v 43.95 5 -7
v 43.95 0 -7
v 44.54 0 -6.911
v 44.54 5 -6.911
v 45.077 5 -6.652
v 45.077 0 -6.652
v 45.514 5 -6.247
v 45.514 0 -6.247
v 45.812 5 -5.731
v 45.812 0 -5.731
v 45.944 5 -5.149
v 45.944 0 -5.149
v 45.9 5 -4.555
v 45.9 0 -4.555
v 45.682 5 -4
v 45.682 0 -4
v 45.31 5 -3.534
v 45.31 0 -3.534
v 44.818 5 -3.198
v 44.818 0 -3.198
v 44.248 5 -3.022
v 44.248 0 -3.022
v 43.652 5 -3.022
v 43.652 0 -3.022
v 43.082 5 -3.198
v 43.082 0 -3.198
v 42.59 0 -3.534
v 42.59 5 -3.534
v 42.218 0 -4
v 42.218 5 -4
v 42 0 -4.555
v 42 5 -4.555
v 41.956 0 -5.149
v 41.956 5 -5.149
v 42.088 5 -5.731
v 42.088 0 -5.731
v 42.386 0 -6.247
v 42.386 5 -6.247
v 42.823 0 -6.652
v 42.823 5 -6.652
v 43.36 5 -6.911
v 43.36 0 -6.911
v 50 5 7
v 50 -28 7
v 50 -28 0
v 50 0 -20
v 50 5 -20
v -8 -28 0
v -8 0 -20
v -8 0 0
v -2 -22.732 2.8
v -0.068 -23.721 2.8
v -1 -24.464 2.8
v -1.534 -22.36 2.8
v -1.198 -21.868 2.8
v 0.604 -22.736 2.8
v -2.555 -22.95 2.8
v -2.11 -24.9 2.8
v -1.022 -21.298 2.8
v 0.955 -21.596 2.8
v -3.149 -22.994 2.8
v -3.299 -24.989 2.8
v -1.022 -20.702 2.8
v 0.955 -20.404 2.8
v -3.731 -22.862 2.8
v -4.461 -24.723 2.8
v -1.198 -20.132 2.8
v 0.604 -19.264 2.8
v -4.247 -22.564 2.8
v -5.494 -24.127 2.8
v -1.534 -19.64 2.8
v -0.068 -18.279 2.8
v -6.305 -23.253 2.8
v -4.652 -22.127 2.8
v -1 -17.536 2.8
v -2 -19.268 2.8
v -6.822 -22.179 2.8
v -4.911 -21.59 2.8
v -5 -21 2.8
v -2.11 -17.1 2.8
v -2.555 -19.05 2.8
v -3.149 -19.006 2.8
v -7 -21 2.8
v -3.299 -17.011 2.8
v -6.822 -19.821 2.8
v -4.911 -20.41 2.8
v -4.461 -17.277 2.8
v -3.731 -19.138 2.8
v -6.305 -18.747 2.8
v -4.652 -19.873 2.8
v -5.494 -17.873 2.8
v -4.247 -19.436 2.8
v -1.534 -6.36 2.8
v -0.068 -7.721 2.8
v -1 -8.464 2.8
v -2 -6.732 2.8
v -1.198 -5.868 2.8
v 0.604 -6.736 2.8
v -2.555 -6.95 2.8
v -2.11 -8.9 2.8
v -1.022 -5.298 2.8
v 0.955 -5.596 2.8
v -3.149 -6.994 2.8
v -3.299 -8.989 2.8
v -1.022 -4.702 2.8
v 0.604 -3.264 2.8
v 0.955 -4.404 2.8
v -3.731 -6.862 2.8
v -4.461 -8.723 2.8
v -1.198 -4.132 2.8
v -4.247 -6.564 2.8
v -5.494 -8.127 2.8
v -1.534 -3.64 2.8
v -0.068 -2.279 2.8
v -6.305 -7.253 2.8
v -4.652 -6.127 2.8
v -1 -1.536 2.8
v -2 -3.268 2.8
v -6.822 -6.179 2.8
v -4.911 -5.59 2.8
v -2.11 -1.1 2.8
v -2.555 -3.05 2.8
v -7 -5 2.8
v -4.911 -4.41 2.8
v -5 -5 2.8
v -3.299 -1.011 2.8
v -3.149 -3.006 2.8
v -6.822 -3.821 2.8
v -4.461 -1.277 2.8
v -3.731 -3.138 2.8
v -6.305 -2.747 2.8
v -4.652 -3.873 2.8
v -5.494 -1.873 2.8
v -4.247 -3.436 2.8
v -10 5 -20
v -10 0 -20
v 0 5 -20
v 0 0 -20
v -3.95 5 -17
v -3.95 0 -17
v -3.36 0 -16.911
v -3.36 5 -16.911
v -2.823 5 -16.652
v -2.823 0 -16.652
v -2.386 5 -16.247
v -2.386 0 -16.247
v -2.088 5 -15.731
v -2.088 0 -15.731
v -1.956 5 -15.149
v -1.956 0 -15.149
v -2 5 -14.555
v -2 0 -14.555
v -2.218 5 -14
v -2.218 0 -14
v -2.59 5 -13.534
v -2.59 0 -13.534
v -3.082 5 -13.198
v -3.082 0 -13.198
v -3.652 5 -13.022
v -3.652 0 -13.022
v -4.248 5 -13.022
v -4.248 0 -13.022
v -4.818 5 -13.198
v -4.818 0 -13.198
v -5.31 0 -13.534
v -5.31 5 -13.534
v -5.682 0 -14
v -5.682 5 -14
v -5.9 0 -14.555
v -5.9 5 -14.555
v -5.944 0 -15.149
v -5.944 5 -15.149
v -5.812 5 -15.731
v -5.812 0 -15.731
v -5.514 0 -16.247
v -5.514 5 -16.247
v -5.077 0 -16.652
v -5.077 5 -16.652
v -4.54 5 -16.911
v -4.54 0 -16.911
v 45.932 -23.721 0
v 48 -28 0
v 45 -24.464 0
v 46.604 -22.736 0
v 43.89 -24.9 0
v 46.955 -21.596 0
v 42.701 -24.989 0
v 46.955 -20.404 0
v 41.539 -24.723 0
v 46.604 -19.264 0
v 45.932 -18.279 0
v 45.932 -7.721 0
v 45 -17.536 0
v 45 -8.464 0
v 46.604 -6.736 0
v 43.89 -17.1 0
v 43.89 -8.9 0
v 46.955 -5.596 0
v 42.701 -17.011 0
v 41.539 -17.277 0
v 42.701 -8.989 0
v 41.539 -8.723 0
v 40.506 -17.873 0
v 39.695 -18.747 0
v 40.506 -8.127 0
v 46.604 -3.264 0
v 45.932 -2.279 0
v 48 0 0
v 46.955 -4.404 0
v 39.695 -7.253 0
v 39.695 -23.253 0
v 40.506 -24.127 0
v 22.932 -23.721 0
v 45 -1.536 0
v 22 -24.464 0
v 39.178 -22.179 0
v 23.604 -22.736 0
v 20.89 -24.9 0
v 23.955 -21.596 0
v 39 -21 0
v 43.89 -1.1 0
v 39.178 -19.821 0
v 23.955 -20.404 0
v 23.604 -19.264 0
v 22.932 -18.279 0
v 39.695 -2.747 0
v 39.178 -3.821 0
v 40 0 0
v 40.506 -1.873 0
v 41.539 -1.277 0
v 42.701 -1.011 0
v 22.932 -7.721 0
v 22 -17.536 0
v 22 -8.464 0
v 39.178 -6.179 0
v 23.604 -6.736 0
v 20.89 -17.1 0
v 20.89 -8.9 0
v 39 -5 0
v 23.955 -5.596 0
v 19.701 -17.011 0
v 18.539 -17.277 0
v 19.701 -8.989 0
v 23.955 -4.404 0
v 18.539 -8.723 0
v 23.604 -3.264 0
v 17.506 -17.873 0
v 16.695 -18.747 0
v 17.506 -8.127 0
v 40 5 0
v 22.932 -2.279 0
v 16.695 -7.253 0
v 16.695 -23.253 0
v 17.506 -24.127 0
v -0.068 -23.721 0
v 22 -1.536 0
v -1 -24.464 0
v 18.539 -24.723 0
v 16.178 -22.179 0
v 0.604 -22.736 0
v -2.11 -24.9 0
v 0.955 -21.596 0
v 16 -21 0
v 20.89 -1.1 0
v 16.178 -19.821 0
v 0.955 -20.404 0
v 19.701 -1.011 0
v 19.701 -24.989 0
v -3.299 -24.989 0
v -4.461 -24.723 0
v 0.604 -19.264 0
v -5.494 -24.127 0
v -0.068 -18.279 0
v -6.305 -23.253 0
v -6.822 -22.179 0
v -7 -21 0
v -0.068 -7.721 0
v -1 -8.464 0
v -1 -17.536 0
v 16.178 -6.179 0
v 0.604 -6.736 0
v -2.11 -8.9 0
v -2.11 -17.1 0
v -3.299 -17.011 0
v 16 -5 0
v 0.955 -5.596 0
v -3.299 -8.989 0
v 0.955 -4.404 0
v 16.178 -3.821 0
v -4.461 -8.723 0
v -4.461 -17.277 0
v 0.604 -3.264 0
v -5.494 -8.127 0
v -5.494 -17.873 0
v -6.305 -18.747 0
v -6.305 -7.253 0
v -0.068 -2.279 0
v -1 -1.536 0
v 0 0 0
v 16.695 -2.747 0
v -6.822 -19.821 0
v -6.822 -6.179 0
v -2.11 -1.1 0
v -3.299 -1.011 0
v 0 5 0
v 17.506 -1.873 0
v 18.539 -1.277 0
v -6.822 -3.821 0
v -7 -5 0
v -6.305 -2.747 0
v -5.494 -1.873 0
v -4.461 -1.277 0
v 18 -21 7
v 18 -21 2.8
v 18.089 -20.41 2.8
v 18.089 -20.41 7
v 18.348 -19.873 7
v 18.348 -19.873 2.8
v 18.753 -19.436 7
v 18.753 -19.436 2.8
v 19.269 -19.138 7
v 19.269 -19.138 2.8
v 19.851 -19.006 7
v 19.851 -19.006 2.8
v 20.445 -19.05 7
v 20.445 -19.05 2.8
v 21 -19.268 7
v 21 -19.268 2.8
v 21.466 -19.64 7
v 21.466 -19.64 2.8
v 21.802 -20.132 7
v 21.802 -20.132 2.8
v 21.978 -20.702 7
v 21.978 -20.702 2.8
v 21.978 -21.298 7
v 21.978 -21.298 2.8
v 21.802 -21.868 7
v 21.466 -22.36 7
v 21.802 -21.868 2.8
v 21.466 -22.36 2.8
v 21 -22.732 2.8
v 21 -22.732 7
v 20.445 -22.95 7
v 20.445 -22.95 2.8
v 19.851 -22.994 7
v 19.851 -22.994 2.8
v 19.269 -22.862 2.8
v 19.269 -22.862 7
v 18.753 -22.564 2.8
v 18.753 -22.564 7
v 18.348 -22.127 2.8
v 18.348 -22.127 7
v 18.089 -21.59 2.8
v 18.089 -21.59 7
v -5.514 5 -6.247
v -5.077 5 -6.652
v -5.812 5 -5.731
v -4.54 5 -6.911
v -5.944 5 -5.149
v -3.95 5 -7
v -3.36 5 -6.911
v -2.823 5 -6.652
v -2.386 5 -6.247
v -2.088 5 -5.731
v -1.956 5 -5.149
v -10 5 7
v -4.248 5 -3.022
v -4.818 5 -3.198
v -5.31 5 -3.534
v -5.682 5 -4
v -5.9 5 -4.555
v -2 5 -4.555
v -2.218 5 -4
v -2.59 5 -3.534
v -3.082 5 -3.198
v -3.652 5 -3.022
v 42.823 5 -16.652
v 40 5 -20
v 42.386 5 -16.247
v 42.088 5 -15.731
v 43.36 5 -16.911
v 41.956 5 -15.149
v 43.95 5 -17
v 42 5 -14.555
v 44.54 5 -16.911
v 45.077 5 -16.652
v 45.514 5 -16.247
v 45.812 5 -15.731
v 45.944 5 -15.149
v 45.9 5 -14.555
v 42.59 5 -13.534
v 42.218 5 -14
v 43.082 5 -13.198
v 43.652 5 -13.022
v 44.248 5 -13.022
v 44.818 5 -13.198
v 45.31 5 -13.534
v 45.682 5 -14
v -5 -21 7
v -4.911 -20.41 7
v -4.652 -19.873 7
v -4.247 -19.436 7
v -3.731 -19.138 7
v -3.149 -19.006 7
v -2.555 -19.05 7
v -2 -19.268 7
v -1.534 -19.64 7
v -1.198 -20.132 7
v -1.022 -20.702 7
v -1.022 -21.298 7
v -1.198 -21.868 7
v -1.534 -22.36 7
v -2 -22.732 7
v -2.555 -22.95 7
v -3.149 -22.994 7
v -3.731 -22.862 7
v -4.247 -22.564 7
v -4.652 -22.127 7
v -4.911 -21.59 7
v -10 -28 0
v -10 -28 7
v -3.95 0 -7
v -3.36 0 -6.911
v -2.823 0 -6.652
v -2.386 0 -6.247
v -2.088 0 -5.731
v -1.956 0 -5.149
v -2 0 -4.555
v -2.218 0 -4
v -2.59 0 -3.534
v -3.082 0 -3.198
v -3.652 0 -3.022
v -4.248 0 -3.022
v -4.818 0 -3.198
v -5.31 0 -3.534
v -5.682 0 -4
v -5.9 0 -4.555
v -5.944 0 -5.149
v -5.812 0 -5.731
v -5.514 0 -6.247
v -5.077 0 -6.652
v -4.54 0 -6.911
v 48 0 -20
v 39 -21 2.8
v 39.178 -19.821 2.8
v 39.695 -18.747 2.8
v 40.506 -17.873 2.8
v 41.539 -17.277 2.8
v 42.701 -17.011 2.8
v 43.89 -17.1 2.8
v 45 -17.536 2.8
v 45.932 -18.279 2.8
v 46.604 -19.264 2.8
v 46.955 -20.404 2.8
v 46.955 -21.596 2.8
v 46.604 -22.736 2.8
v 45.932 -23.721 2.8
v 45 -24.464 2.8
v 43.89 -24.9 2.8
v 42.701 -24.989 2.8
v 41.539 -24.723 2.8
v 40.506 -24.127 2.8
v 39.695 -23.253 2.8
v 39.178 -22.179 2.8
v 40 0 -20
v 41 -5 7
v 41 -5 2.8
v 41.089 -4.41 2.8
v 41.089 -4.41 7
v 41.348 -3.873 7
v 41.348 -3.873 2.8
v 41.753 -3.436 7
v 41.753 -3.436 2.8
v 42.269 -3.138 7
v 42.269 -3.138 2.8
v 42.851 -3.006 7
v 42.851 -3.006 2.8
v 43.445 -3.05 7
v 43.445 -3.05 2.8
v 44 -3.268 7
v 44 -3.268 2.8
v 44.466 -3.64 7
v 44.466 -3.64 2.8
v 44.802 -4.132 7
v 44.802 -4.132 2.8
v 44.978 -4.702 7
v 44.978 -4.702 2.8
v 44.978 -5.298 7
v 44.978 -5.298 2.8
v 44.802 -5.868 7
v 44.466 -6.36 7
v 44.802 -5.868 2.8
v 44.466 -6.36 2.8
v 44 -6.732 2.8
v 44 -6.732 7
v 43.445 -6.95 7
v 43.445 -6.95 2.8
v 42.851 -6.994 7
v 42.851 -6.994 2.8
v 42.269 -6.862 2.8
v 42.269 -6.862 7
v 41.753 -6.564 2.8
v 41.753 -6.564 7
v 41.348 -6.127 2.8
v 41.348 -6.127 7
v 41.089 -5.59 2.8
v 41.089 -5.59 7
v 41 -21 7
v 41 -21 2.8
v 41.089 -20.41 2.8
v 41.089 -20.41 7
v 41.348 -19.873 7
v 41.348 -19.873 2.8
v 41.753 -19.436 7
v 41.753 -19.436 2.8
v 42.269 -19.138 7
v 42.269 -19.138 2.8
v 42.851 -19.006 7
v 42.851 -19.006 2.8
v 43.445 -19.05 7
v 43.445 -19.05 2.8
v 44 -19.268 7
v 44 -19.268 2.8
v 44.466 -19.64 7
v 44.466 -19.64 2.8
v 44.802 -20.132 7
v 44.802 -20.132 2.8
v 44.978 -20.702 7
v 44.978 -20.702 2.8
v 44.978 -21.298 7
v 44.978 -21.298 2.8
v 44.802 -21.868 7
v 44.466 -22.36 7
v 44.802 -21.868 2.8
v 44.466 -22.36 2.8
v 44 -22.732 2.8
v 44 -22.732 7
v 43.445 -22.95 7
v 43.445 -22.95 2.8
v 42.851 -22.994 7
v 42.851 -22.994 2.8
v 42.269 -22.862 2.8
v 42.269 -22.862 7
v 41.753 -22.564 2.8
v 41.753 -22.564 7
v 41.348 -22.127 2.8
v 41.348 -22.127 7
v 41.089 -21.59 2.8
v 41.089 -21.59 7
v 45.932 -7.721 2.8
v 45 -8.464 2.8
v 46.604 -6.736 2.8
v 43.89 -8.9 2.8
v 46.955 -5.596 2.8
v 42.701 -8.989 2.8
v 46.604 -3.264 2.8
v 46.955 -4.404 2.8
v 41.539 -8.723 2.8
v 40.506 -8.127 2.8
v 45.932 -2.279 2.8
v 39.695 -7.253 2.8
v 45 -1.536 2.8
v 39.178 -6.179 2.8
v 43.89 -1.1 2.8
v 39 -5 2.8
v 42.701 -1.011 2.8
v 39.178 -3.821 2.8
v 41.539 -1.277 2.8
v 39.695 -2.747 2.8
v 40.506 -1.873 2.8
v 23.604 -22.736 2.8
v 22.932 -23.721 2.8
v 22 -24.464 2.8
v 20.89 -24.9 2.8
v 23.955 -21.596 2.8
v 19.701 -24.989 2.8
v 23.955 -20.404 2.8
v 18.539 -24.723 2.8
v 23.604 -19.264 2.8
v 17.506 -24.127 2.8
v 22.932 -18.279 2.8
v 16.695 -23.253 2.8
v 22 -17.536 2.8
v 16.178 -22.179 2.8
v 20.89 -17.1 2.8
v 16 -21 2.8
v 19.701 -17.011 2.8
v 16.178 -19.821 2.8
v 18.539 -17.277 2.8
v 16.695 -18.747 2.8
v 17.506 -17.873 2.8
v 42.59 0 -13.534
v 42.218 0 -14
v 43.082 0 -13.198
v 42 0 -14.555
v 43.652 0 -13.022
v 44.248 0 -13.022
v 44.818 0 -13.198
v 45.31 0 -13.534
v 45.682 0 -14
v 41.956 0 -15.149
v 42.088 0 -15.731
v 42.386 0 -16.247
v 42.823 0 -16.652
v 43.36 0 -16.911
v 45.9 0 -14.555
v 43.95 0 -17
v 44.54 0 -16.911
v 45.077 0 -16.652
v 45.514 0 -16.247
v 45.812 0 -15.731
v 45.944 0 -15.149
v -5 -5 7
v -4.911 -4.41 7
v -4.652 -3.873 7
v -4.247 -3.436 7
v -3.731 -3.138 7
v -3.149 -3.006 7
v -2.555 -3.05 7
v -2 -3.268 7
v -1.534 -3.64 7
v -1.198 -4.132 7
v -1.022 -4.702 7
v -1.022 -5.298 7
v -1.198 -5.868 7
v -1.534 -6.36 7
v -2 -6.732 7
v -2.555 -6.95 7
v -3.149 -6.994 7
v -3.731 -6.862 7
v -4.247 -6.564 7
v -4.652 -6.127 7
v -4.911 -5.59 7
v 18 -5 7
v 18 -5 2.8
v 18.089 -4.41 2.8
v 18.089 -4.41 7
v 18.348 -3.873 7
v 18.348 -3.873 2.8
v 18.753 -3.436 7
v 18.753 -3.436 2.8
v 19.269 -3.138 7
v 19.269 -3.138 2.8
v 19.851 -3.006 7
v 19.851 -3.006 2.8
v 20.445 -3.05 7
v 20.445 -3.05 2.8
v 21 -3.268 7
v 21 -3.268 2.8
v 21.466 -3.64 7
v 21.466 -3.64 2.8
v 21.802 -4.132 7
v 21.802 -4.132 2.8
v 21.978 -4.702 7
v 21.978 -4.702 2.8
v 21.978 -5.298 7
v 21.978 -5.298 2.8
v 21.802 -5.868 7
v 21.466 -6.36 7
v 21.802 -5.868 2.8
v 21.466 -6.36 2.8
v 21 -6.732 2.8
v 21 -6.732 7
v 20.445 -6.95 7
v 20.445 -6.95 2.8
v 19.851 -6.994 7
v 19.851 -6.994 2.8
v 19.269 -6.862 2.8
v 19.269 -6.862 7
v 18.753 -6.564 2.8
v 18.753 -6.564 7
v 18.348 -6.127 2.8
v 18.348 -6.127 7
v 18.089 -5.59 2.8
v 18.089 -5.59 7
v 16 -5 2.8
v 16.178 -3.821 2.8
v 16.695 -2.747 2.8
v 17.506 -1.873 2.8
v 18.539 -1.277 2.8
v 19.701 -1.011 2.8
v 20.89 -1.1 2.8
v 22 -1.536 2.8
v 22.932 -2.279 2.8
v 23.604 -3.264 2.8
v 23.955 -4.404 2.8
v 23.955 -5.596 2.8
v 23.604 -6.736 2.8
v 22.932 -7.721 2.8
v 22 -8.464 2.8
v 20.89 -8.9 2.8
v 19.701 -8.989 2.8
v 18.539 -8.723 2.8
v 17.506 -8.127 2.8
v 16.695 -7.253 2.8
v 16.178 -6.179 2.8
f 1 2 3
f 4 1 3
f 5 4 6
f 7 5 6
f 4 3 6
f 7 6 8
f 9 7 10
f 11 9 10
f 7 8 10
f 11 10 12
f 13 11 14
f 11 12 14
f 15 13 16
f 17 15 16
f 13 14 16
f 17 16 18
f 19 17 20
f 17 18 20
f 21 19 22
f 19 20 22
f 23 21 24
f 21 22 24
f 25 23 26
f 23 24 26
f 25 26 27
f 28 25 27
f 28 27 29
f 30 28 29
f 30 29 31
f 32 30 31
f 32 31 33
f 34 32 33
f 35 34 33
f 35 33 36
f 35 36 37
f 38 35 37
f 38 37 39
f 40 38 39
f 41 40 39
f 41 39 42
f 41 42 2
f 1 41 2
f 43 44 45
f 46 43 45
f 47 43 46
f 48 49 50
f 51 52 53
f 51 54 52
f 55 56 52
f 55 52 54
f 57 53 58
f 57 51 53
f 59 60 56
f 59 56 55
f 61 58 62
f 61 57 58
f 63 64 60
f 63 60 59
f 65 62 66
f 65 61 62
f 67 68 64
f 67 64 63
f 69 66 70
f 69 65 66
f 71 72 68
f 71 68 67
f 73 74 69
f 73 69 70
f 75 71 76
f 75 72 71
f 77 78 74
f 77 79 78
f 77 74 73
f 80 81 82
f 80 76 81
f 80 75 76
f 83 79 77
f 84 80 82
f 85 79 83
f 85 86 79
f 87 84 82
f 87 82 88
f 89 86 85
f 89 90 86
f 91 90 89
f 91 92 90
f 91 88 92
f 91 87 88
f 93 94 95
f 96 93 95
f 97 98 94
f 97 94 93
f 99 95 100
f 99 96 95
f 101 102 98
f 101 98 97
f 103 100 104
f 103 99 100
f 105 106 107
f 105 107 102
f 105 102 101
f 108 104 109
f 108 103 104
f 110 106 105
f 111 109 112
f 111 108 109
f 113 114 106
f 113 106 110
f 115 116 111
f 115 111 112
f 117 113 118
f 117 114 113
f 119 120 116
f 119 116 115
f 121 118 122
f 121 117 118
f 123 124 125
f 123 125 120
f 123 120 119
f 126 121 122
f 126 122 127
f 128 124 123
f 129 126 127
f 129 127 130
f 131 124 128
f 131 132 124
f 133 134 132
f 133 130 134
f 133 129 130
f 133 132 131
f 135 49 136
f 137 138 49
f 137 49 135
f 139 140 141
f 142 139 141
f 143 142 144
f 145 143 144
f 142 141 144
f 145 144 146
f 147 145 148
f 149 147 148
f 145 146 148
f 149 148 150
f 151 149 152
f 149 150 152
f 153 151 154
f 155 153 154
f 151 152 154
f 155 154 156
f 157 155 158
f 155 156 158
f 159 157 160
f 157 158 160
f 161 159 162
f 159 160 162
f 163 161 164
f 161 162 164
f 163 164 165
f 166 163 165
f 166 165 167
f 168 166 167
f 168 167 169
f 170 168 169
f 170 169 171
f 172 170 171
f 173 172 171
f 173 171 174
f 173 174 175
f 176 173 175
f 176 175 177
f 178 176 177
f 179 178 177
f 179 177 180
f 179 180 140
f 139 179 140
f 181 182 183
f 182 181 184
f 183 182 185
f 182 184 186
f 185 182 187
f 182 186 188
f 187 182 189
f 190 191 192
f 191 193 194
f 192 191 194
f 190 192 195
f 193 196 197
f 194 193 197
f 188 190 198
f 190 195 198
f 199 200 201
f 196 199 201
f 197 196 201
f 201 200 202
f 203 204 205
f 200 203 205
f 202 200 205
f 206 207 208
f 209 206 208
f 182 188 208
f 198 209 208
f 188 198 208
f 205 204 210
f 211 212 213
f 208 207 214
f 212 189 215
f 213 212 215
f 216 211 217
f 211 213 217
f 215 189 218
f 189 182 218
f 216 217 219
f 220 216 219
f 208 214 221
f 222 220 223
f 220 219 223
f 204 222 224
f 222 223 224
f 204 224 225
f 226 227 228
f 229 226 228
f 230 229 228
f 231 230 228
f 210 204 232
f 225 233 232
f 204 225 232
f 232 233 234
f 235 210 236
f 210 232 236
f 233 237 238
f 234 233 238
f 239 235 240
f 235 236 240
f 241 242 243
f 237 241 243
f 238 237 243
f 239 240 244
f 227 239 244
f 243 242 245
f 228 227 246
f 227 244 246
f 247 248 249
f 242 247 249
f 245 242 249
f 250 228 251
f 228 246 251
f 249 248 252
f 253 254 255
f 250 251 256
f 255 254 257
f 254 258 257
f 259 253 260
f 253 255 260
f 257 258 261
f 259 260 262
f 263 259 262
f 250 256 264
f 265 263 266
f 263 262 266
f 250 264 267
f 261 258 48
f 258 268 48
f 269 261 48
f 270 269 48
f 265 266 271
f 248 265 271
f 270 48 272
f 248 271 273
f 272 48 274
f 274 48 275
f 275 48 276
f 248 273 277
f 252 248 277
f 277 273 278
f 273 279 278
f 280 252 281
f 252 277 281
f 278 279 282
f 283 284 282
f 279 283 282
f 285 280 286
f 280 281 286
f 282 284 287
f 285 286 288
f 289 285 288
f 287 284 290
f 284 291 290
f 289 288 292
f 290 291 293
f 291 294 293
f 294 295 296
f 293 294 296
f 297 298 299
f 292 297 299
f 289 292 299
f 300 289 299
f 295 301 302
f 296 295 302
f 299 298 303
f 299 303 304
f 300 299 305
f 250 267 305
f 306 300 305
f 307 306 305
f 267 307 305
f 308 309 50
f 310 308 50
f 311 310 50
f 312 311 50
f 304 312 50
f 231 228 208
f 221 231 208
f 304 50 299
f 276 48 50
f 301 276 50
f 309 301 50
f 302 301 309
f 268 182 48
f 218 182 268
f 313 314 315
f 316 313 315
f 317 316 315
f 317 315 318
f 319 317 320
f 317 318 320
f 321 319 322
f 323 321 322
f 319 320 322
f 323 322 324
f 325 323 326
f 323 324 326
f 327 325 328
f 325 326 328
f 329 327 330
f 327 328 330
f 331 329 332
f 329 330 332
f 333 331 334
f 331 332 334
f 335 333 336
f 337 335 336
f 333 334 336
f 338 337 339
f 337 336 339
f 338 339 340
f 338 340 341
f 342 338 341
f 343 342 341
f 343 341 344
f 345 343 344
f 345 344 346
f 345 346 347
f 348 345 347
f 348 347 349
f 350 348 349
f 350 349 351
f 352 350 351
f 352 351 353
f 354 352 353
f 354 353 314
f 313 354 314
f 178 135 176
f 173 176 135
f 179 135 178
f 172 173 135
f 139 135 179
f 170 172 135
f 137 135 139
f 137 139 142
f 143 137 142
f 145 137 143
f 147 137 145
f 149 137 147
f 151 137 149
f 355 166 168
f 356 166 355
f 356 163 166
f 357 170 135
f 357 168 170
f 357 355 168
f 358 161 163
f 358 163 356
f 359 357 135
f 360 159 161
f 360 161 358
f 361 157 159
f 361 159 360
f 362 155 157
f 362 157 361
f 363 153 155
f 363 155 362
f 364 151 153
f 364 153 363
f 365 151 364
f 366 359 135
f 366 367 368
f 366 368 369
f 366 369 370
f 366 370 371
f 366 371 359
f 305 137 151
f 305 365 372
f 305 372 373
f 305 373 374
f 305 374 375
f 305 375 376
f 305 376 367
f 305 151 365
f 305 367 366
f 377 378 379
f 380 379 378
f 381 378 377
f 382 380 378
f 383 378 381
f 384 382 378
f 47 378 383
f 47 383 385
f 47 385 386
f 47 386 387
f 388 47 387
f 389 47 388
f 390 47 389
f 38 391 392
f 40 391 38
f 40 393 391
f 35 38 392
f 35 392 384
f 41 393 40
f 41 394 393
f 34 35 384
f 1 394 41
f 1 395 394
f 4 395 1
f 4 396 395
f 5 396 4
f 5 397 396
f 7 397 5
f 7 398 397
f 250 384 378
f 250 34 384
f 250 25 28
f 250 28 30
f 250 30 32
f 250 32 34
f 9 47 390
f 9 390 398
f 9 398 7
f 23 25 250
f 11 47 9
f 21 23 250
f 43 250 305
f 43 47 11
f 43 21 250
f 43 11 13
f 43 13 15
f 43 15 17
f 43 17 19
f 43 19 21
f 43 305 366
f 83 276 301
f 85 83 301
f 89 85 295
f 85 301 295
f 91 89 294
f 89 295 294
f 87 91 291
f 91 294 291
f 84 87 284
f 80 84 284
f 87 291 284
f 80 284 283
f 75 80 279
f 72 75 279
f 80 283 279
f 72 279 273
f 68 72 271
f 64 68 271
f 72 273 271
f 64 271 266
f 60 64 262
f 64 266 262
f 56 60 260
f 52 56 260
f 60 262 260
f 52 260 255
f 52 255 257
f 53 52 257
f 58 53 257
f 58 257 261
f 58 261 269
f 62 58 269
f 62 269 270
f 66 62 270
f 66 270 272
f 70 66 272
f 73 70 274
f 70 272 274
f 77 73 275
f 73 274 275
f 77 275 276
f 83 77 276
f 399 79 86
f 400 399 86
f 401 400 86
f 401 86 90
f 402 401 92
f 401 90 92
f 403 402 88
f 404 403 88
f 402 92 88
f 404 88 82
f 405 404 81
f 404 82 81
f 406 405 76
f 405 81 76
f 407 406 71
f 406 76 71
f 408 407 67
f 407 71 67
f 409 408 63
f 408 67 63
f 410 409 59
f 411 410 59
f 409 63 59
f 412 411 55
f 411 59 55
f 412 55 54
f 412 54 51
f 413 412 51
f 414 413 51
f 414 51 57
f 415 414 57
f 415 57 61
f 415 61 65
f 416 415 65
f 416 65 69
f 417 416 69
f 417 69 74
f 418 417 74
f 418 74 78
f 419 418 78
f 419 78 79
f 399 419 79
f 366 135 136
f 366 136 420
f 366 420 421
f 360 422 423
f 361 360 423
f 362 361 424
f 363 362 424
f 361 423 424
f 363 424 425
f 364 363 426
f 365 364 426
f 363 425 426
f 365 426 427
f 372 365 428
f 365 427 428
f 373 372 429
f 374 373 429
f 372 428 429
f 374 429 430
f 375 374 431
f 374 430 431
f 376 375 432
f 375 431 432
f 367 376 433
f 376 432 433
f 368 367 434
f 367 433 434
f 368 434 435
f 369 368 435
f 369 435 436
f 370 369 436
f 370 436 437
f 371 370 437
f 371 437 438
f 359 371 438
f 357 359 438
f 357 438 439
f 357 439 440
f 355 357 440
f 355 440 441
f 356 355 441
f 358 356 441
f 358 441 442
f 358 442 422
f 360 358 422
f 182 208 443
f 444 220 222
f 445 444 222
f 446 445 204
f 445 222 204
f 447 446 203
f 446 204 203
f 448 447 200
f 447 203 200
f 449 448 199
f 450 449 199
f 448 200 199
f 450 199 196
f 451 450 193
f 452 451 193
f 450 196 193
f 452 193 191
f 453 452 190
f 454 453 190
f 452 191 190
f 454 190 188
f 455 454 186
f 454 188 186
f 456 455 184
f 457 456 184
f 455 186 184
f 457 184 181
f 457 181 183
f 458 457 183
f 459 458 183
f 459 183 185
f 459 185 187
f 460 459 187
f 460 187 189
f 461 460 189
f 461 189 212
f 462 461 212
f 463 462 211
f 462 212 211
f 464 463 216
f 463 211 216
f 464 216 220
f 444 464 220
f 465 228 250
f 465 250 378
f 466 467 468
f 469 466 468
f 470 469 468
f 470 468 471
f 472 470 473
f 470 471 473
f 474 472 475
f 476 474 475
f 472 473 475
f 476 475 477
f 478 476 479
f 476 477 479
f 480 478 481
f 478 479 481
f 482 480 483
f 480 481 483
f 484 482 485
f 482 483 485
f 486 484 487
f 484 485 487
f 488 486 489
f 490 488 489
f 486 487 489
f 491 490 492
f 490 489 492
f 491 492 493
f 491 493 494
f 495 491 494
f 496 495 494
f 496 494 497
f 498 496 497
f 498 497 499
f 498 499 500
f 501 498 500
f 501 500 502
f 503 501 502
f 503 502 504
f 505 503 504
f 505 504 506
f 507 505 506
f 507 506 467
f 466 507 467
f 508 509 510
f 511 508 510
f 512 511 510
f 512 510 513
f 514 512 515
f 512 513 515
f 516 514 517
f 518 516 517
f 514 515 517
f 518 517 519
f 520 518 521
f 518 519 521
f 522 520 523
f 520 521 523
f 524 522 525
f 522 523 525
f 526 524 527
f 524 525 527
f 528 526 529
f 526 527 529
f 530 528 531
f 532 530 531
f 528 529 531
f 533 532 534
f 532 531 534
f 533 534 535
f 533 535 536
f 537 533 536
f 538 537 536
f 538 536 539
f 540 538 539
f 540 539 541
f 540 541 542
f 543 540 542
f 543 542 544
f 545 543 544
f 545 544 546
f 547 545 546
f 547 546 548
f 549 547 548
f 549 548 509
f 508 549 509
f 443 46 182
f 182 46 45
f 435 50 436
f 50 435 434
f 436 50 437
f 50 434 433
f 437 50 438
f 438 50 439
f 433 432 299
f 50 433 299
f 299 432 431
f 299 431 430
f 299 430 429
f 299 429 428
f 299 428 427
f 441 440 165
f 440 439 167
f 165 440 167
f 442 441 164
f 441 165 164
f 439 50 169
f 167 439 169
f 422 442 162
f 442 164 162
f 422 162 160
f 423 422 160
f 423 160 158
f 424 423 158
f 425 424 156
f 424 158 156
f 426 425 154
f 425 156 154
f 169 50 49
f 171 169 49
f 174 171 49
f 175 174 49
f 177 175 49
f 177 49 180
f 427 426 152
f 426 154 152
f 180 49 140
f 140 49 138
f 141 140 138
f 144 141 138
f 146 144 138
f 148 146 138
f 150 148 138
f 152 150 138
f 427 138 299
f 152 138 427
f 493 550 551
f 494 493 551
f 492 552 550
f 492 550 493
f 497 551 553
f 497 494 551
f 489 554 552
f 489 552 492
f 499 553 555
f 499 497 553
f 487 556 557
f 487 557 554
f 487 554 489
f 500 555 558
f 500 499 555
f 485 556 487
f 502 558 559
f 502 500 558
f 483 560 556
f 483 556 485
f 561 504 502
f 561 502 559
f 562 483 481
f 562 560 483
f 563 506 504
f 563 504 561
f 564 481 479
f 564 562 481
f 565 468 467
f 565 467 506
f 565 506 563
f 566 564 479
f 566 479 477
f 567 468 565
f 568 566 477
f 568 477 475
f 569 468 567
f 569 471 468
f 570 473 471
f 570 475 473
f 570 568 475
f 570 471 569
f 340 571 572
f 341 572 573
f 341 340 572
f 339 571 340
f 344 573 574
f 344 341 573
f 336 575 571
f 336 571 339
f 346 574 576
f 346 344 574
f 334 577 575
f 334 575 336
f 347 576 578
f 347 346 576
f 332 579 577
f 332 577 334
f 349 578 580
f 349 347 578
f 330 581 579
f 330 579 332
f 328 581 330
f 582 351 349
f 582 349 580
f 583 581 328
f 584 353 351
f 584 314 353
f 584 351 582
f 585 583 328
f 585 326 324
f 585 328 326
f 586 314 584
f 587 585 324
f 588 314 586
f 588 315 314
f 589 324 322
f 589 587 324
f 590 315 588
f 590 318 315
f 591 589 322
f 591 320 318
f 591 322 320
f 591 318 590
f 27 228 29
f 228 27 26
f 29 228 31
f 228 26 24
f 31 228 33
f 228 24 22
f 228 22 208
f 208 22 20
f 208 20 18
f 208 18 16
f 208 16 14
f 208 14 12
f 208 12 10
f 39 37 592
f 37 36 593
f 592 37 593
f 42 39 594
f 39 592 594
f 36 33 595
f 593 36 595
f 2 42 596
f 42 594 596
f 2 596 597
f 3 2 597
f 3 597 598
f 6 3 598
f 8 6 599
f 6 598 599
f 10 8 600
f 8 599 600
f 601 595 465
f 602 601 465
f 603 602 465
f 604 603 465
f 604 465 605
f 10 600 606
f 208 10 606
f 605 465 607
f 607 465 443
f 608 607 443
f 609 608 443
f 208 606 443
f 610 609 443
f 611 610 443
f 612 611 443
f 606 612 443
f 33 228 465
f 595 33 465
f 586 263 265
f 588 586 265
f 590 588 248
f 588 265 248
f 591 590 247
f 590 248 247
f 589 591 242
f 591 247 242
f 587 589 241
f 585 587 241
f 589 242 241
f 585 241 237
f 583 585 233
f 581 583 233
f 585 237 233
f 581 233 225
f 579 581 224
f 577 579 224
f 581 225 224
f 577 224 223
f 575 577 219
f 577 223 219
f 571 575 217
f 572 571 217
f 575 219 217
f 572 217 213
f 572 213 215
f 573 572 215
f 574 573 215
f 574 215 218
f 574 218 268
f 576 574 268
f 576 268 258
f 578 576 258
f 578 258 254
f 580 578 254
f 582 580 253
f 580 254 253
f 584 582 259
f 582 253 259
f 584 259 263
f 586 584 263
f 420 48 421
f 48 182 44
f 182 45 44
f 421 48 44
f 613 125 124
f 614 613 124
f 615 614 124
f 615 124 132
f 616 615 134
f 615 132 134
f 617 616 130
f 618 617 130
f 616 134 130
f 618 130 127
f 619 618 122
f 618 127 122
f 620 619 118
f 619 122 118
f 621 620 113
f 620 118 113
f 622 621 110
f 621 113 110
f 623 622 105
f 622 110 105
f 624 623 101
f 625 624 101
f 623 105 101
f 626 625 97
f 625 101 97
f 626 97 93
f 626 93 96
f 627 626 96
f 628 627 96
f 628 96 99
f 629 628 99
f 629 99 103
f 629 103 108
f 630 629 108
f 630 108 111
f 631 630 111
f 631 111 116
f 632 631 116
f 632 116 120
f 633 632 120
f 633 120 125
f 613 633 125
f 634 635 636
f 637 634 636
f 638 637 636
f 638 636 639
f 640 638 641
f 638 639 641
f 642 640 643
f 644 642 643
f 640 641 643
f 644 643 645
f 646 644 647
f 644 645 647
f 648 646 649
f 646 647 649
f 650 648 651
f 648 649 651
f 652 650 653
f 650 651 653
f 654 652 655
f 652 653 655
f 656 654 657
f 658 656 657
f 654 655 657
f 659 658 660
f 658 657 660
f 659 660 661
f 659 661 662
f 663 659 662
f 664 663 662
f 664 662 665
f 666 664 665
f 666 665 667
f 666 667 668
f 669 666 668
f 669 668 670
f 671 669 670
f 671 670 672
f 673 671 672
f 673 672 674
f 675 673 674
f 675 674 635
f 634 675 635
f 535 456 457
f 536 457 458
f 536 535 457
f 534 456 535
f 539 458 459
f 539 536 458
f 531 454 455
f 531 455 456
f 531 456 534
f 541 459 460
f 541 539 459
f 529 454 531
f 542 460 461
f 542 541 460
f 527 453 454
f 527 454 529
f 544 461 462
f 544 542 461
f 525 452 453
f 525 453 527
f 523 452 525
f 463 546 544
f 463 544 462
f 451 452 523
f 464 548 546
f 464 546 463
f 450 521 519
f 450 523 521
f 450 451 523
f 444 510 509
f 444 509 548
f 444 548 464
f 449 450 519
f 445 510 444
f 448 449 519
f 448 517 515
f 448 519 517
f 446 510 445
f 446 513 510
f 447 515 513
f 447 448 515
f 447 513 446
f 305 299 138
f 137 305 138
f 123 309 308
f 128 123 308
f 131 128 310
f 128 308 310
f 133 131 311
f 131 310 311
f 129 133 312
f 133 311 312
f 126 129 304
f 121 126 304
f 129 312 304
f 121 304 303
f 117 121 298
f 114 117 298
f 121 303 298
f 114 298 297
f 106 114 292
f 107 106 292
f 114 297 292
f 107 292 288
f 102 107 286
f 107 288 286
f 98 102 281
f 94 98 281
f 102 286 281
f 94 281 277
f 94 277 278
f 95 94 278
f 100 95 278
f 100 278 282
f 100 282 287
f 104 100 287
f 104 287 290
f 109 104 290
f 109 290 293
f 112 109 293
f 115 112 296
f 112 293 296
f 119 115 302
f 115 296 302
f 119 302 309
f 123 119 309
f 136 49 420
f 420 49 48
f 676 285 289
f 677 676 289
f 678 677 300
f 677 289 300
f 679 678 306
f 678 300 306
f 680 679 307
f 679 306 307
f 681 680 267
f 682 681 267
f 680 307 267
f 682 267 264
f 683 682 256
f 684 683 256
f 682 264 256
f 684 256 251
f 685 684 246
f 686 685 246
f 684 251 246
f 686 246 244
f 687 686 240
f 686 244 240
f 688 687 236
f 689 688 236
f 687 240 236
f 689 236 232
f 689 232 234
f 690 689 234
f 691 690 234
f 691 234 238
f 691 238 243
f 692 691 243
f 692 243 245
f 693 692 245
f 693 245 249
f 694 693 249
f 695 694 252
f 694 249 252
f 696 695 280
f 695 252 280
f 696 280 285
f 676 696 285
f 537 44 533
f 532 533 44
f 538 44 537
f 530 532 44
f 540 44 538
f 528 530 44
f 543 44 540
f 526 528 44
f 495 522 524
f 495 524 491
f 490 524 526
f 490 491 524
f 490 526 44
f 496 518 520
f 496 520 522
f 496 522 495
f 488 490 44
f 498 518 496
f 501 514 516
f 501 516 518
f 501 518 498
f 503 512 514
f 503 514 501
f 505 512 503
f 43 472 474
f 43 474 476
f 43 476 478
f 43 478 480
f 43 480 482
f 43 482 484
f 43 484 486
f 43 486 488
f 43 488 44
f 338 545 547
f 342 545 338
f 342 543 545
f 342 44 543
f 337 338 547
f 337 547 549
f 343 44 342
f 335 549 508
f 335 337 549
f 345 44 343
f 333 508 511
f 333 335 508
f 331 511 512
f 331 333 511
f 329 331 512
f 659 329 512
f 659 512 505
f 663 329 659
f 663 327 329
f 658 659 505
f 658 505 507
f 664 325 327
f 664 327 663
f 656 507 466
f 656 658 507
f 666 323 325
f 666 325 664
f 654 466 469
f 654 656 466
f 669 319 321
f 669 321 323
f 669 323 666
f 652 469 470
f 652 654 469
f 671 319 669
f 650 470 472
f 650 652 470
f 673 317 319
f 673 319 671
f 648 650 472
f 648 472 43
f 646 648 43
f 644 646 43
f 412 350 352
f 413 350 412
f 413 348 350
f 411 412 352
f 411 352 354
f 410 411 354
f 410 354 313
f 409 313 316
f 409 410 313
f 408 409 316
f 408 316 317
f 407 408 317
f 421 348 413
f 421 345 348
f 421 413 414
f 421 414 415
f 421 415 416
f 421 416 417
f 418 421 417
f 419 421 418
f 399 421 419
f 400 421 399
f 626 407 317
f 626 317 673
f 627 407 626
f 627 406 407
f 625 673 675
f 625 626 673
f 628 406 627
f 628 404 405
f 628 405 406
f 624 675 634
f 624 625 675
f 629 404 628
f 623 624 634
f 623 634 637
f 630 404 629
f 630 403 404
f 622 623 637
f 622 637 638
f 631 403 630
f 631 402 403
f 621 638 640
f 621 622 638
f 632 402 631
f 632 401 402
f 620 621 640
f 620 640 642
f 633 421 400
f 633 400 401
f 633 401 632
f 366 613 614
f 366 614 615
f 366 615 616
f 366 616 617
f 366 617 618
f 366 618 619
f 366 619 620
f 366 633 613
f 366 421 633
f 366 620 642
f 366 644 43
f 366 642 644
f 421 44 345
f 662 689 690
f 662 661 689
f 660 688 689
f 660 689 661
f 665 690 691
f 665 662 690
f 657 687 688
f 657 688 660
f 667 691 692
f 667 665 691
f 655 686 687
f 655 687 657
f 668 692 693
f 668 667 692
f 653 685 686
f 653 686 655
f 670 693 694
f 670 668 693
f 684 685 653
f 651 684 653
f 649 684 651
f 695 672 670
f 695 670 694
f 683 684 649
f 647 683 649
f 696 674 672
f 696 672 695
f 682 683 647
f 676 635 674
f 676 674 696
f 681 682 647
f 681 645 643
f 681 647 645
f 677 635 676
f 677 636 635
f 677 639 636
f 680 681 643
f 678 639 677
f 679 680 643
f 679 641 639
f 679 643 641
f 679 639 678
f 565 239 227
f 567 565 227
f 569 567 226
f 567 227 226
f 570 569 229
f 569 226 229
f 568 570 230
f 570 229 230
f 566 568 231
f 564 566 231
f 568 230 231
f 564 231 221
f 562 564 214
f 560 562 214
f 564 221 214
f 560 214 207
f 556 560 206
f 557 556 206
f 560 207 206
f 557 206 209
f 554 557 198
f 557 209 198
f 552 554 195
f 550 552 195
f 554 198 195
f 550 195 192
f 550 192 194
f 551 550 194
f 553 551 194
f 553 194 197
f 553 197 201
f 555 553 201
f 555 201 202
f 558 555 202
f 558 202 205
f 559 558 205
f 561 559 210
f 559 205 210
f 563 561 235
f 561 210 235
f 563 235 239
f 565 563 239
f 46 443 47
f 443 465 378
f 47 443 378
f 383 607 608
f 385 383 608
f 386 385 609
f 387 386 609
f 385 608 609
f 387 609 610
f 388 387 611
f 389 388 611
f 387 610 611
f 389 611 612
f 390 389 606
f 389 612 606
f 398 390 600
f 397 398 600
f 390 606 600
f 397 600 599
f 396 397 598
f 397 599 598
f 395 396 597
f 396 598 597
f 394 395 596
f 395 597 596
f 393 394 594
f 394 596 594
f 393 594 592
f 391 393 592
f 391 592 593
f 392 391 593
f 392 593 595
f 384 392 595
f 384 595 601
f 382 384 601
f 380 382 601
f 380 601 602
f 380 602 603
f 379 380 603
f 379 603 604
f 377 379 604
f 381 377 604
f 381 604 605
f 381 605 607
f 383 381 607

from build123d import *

# Parameters (mm, degrees)
SKETCH2_W               = 8
SKETCH2_H               = 20
SKETCH2_W_2             = 11.75
SKETCH2_H_2             = 12.66
BOSS_EXTRUDE1_DEPTH     = 5
SKETCH3_W               = 13.1
SKETCH3_H               = 7
BOSS_EXTRUDE2_DEPTH     = 28
SKETCH4_W               = 5.75
SKETCH4_H               = 12.66
CUT_EXTRUDE1_DEPTH      = 62.587336361
SKETCH5_R               = 2
CUT_EXTRUDE2_DEPTH      = 61.902073035
SKETCH6_R               = 2
CUT_EXTRUDE3_DEPTH      = 60.059292241
SKETCH7_W               = 7
SKETCH7_H               = 28
BOSS_EXTRUDE3_DEPTH     = 19.4
SKETCH8_W               = 27
SKETCH8_H               = 33
BOSS_EXTRUDE4_DEPTH     = 2
SKETCH9_W               = 27
SKETCH9_H               = 33
BOSS_EXTRUDE5_DEPTH     = 2
CUT_EXTRUDE4_DEPTH      = 68.4388612
CUT_EXTRUDE4_DEPTH_BACK = 68.4388612
SKETCH11_W              = 12.66
SKETCH11_H              = 33
CUT_EXTRUDE5_DEPTH      = 48.572287101
SKETCH12_R              = 2
CUT_EXTRUDE6_DEPTH      = 61.695963622
SKETCH13_R              = 4
SKETCH13_R_2            = 2
CUT_EXTRUDE7_DEPTH      = 2.8


with BuildPart() as part:
    # Sketch2 → Boss-Extrude1 (new body)
    with BuildSketch(Plane(origin=(0, 0, 0), x_dir=(1, 0, 0), z_dir=(0, 1, 0))):
        with Locations((-4, 10)):
            Rectangle(SKETCH2_W, SKETCH2_H)
        Polygon((40, 0), (0, 0), (-8, 0), (-8, -7), (3.75, -7), (16.85, -7), (28.6, -7), (48, -7), (48, 0), align=None)
        with Locations((-2.125, -13.33)):
            Rectangle(SKETCH2_W_2, SKETCH2_H_2)
        with Locations((22.725, -13.33)):
            Rectangle(SKETCH2_W_2, SKETCH2_H_2)
        with Locations((44, 10)):
            Rectangle(SKETCH2_W, SKETCH2_H)
    extrude(amount=BOSS_EXTRUDE1_DEPTH)

    # Sketch3 → Boss-Extrude2 (add)
    with BuildSketch(Plane.XZ):
        Polygon((3.75, 19.66), (-8, 19.66), (-8, 0), (0, 0), (3.75, 0), (3.75, 7), align=None)
        with Locations((10.3, 3.5)):
            Rectangle(SKETCH3_W, SKETCH3_H)
        Polygon((16.85, 19.66), (16.85, 7), (16.85, 0), (28.6, 0), (28.6, 7), (28.6, 19.66), align=None)
    extrude(amount=BOSS_EXTRUDE2_DEPTH)

    # Sketch4 → Cut-Extrude1 (cut, through all)
    with BuildSketch(Plane.XZ.offset(28)):
        with Locations((-5.125, 13.33)):
            Rectangle(SKETCH4_W, SKETCH4_H)
        with Locations((25.725, 13.33)):
            Rectangle(SKETCH4_W, SKETCH4_H)
    extrude(amount=-CUT_EXTRUDE1_DEPTH, mode=Mode.SUBTRACT)

    # Sketch5 → Cut-Extrude2 (cut, through all)
    with BuildSketch(Plane.ZY.offset(2.25)):
        with Locations((13.33, -2)):
            Circle(SKETCH5_R)
        with Locations((13.33, -21)):
            Circle(SKETCH5_R)
        with Locations((13.33, -11.5)):
            Circle(SKETCH5_R)
    extrude(amount=-CUT_EXTRUDE2_DEPTH, mode=Mode.SUBTRACT)

    # Sketch6 → Cut-Extrude3 (cut, through all)
    with BuildSketch(Plane.XZ):
        with Locations(Location((43.95, -5, 0), (0, 0, 270))):
            Circle(SKETCH6_R)
        with Locations(Location((43.95, -15, 0), (0, 0, 270))):
            Circle(SKETCH6_R)
        with Locations(Location((-3.95, -5, 0), (0, 0, 270))):
            Circle(SKETCH6_R)
        with Locations(Location((-3.95, -15, 0), (0, 0, 270))):
            Circle(SKETCH6_R)
    extrude(amount=-CUT_EXTRUDE3_DEPTH, mode=Mode.SUBTRACT)

    # Sketch7 → Boss-Extrude3 (add)
    with BuildSketch(Plane(origin=(28.6, 0, 0), x_dir=(0, 0, -1), z_dir=(1, 0, 0))):
        with Locations((-3.5, -14)):
            Rectangle(SKETCH7_W, SKETCH7_H)
    extrude(amount=BOSS_EXTRUDE3_DEPTH)

    # Sketch8 → Boss-Extrude4 (add)
    with BuildSketch(Plane(origin=(48, 0, 0), x_dir=(0, 0, -1), z_dir=(1, 0, 0))):
        with Locations((6.5, -11.5)):
            Rectangle(SKETCH8_W, SKETCH8_H)
    extrude(amount=BOSS_EXTRUDE4_DEPTH)

    # Sketch9 → Boss-Extrude5 (add)
    with BuildSketch(Plane.ZY.offset(8)):
        with Locations((-6.5, -11.5)):
            Rectangle(SKETCH9_W, SKETCH9_H)
    extrude(amount=BOSS_EXTRUDE5_DEPTH)

    # Sketch10 → Cut-Extrude4 (cut, two sides: drawn at the far end of the back side and taken through both)
    with BuildSketch(Plane.ZY.offset(-48).offset(-CUT_EXTRUDE4_DEPTH_BACK)):
        Polygon((-20, 0), (0, -28), (-20, -28), align=None)
    extrude(amount=CUT_EXTRUDE4_DEPTH + CUT_EXTRUDE4_DEPTH_BACK, mode=Mode.SUBTRACT)

    # Sketch11 → Cut-Extrude5 (cut, through all)
    with BuildSketch(Plane(origin=(22.85, 0, 0), x_dir=(0, 0, -1), z_dir=(1, 0, 0))):
        with Locations((-13.33, -11.5)):
            Rectangle(SKETCH11_W, SKETCH11_H)
    extrude(amount=-CUT_EXTRUDE5_DEPTH, mode=Mode.SUBTRACT)

    # Sketch12 → Cut-Extrude6 (cut, through all)
    with BuildSketch(Plane(origin=(0, 0, 0), x_dir=(-1, 0, 0), z_dir=(0, 0, -1))):
        with Locations((-43, -5)):
            Circle(SKETCH12_R)
        with Locations((3, -5)):
            Circle(SKETCH12_R)
        with Locations((3, -21)):
            Circle(SKETCH12_R)
        with Locations((-43, -21)):
            Circle(SKETCH12_R)
        with Locations((-20, -5)):
            Circle(SKETCH12_R)
        with Locations((-20, -21)):
            Circle(SKETCH12_R)
    extrude(amount=-CUT_EXTRUDE6_DEPTH, mode=Mode.SUBTRACT)

    # Sketch13 → Cut-Extrude7 (cut)
    # profile 1 of 6: a face of its own
    with BuildSketch(Plane(origin=(0, 0, 0), x_dir=(-1, 0, 0), z_dir=(0, 0, -1))):
        with Locations((3, -5)):
            Circle(SKETCH13_R)
        with Locations((3, -5)):
            Circle(SKETCH13_R_2, mode=Mode.SUBTRACT)
    # profile 2 of 6: a face of its own
    with BuildSketch(Plane(origin=(0, 0, 0), x_dir=(-1, 0, 0), z_dir=(0, 0, -1))):
        with Locations((-43, -5)):
            Circle(SKETCH13_R)
        with Locations((-43, -5)):
            Circle(SKETCH13_R_2, mode=Mode.SUBTRACT)
    # profile 3 of 6: a face of its own
    with BuildSketch(Plane(origin=(0, 0, 0), x_dir=(-1, 0, 0), z_dir=(0, 0, -1))):
        with Locations((3, -21)):
            Circle(SKETCH13_R)
    # profile 4 of 6: a face of its own
    with BuildSketch(Plane(origin=(0, 0, 0), x_dir=(-1, 0, 0), z_dir=(0, 0, -1))):
        with Locations((-43, -21)):
            Circle(SKETCH13_R)
    # profile 5 of 6: a face of its own
    with BuildSketch(Plane(origin=(0, 0, 0), x_dir=(-1, 0, 0), z_dir=(0, 0, -1))):
        with Locations((-20, -21)):
            Circle(SKETCH13_R)
    # profile 6 of 6: a face of its own
    with BuildSketch(Plane(origin=(0, 0, 0), x_dir=(-1, 0, 0), z_dir=(0, 0, -1))):
        with Locations((-20, -5)):
            Circle(SKETCH13_R)
    extrude(amount=-CUT_EXTRUDE7_DEPTH, mode=Mode.SUBTRACT)


solid = part.part
